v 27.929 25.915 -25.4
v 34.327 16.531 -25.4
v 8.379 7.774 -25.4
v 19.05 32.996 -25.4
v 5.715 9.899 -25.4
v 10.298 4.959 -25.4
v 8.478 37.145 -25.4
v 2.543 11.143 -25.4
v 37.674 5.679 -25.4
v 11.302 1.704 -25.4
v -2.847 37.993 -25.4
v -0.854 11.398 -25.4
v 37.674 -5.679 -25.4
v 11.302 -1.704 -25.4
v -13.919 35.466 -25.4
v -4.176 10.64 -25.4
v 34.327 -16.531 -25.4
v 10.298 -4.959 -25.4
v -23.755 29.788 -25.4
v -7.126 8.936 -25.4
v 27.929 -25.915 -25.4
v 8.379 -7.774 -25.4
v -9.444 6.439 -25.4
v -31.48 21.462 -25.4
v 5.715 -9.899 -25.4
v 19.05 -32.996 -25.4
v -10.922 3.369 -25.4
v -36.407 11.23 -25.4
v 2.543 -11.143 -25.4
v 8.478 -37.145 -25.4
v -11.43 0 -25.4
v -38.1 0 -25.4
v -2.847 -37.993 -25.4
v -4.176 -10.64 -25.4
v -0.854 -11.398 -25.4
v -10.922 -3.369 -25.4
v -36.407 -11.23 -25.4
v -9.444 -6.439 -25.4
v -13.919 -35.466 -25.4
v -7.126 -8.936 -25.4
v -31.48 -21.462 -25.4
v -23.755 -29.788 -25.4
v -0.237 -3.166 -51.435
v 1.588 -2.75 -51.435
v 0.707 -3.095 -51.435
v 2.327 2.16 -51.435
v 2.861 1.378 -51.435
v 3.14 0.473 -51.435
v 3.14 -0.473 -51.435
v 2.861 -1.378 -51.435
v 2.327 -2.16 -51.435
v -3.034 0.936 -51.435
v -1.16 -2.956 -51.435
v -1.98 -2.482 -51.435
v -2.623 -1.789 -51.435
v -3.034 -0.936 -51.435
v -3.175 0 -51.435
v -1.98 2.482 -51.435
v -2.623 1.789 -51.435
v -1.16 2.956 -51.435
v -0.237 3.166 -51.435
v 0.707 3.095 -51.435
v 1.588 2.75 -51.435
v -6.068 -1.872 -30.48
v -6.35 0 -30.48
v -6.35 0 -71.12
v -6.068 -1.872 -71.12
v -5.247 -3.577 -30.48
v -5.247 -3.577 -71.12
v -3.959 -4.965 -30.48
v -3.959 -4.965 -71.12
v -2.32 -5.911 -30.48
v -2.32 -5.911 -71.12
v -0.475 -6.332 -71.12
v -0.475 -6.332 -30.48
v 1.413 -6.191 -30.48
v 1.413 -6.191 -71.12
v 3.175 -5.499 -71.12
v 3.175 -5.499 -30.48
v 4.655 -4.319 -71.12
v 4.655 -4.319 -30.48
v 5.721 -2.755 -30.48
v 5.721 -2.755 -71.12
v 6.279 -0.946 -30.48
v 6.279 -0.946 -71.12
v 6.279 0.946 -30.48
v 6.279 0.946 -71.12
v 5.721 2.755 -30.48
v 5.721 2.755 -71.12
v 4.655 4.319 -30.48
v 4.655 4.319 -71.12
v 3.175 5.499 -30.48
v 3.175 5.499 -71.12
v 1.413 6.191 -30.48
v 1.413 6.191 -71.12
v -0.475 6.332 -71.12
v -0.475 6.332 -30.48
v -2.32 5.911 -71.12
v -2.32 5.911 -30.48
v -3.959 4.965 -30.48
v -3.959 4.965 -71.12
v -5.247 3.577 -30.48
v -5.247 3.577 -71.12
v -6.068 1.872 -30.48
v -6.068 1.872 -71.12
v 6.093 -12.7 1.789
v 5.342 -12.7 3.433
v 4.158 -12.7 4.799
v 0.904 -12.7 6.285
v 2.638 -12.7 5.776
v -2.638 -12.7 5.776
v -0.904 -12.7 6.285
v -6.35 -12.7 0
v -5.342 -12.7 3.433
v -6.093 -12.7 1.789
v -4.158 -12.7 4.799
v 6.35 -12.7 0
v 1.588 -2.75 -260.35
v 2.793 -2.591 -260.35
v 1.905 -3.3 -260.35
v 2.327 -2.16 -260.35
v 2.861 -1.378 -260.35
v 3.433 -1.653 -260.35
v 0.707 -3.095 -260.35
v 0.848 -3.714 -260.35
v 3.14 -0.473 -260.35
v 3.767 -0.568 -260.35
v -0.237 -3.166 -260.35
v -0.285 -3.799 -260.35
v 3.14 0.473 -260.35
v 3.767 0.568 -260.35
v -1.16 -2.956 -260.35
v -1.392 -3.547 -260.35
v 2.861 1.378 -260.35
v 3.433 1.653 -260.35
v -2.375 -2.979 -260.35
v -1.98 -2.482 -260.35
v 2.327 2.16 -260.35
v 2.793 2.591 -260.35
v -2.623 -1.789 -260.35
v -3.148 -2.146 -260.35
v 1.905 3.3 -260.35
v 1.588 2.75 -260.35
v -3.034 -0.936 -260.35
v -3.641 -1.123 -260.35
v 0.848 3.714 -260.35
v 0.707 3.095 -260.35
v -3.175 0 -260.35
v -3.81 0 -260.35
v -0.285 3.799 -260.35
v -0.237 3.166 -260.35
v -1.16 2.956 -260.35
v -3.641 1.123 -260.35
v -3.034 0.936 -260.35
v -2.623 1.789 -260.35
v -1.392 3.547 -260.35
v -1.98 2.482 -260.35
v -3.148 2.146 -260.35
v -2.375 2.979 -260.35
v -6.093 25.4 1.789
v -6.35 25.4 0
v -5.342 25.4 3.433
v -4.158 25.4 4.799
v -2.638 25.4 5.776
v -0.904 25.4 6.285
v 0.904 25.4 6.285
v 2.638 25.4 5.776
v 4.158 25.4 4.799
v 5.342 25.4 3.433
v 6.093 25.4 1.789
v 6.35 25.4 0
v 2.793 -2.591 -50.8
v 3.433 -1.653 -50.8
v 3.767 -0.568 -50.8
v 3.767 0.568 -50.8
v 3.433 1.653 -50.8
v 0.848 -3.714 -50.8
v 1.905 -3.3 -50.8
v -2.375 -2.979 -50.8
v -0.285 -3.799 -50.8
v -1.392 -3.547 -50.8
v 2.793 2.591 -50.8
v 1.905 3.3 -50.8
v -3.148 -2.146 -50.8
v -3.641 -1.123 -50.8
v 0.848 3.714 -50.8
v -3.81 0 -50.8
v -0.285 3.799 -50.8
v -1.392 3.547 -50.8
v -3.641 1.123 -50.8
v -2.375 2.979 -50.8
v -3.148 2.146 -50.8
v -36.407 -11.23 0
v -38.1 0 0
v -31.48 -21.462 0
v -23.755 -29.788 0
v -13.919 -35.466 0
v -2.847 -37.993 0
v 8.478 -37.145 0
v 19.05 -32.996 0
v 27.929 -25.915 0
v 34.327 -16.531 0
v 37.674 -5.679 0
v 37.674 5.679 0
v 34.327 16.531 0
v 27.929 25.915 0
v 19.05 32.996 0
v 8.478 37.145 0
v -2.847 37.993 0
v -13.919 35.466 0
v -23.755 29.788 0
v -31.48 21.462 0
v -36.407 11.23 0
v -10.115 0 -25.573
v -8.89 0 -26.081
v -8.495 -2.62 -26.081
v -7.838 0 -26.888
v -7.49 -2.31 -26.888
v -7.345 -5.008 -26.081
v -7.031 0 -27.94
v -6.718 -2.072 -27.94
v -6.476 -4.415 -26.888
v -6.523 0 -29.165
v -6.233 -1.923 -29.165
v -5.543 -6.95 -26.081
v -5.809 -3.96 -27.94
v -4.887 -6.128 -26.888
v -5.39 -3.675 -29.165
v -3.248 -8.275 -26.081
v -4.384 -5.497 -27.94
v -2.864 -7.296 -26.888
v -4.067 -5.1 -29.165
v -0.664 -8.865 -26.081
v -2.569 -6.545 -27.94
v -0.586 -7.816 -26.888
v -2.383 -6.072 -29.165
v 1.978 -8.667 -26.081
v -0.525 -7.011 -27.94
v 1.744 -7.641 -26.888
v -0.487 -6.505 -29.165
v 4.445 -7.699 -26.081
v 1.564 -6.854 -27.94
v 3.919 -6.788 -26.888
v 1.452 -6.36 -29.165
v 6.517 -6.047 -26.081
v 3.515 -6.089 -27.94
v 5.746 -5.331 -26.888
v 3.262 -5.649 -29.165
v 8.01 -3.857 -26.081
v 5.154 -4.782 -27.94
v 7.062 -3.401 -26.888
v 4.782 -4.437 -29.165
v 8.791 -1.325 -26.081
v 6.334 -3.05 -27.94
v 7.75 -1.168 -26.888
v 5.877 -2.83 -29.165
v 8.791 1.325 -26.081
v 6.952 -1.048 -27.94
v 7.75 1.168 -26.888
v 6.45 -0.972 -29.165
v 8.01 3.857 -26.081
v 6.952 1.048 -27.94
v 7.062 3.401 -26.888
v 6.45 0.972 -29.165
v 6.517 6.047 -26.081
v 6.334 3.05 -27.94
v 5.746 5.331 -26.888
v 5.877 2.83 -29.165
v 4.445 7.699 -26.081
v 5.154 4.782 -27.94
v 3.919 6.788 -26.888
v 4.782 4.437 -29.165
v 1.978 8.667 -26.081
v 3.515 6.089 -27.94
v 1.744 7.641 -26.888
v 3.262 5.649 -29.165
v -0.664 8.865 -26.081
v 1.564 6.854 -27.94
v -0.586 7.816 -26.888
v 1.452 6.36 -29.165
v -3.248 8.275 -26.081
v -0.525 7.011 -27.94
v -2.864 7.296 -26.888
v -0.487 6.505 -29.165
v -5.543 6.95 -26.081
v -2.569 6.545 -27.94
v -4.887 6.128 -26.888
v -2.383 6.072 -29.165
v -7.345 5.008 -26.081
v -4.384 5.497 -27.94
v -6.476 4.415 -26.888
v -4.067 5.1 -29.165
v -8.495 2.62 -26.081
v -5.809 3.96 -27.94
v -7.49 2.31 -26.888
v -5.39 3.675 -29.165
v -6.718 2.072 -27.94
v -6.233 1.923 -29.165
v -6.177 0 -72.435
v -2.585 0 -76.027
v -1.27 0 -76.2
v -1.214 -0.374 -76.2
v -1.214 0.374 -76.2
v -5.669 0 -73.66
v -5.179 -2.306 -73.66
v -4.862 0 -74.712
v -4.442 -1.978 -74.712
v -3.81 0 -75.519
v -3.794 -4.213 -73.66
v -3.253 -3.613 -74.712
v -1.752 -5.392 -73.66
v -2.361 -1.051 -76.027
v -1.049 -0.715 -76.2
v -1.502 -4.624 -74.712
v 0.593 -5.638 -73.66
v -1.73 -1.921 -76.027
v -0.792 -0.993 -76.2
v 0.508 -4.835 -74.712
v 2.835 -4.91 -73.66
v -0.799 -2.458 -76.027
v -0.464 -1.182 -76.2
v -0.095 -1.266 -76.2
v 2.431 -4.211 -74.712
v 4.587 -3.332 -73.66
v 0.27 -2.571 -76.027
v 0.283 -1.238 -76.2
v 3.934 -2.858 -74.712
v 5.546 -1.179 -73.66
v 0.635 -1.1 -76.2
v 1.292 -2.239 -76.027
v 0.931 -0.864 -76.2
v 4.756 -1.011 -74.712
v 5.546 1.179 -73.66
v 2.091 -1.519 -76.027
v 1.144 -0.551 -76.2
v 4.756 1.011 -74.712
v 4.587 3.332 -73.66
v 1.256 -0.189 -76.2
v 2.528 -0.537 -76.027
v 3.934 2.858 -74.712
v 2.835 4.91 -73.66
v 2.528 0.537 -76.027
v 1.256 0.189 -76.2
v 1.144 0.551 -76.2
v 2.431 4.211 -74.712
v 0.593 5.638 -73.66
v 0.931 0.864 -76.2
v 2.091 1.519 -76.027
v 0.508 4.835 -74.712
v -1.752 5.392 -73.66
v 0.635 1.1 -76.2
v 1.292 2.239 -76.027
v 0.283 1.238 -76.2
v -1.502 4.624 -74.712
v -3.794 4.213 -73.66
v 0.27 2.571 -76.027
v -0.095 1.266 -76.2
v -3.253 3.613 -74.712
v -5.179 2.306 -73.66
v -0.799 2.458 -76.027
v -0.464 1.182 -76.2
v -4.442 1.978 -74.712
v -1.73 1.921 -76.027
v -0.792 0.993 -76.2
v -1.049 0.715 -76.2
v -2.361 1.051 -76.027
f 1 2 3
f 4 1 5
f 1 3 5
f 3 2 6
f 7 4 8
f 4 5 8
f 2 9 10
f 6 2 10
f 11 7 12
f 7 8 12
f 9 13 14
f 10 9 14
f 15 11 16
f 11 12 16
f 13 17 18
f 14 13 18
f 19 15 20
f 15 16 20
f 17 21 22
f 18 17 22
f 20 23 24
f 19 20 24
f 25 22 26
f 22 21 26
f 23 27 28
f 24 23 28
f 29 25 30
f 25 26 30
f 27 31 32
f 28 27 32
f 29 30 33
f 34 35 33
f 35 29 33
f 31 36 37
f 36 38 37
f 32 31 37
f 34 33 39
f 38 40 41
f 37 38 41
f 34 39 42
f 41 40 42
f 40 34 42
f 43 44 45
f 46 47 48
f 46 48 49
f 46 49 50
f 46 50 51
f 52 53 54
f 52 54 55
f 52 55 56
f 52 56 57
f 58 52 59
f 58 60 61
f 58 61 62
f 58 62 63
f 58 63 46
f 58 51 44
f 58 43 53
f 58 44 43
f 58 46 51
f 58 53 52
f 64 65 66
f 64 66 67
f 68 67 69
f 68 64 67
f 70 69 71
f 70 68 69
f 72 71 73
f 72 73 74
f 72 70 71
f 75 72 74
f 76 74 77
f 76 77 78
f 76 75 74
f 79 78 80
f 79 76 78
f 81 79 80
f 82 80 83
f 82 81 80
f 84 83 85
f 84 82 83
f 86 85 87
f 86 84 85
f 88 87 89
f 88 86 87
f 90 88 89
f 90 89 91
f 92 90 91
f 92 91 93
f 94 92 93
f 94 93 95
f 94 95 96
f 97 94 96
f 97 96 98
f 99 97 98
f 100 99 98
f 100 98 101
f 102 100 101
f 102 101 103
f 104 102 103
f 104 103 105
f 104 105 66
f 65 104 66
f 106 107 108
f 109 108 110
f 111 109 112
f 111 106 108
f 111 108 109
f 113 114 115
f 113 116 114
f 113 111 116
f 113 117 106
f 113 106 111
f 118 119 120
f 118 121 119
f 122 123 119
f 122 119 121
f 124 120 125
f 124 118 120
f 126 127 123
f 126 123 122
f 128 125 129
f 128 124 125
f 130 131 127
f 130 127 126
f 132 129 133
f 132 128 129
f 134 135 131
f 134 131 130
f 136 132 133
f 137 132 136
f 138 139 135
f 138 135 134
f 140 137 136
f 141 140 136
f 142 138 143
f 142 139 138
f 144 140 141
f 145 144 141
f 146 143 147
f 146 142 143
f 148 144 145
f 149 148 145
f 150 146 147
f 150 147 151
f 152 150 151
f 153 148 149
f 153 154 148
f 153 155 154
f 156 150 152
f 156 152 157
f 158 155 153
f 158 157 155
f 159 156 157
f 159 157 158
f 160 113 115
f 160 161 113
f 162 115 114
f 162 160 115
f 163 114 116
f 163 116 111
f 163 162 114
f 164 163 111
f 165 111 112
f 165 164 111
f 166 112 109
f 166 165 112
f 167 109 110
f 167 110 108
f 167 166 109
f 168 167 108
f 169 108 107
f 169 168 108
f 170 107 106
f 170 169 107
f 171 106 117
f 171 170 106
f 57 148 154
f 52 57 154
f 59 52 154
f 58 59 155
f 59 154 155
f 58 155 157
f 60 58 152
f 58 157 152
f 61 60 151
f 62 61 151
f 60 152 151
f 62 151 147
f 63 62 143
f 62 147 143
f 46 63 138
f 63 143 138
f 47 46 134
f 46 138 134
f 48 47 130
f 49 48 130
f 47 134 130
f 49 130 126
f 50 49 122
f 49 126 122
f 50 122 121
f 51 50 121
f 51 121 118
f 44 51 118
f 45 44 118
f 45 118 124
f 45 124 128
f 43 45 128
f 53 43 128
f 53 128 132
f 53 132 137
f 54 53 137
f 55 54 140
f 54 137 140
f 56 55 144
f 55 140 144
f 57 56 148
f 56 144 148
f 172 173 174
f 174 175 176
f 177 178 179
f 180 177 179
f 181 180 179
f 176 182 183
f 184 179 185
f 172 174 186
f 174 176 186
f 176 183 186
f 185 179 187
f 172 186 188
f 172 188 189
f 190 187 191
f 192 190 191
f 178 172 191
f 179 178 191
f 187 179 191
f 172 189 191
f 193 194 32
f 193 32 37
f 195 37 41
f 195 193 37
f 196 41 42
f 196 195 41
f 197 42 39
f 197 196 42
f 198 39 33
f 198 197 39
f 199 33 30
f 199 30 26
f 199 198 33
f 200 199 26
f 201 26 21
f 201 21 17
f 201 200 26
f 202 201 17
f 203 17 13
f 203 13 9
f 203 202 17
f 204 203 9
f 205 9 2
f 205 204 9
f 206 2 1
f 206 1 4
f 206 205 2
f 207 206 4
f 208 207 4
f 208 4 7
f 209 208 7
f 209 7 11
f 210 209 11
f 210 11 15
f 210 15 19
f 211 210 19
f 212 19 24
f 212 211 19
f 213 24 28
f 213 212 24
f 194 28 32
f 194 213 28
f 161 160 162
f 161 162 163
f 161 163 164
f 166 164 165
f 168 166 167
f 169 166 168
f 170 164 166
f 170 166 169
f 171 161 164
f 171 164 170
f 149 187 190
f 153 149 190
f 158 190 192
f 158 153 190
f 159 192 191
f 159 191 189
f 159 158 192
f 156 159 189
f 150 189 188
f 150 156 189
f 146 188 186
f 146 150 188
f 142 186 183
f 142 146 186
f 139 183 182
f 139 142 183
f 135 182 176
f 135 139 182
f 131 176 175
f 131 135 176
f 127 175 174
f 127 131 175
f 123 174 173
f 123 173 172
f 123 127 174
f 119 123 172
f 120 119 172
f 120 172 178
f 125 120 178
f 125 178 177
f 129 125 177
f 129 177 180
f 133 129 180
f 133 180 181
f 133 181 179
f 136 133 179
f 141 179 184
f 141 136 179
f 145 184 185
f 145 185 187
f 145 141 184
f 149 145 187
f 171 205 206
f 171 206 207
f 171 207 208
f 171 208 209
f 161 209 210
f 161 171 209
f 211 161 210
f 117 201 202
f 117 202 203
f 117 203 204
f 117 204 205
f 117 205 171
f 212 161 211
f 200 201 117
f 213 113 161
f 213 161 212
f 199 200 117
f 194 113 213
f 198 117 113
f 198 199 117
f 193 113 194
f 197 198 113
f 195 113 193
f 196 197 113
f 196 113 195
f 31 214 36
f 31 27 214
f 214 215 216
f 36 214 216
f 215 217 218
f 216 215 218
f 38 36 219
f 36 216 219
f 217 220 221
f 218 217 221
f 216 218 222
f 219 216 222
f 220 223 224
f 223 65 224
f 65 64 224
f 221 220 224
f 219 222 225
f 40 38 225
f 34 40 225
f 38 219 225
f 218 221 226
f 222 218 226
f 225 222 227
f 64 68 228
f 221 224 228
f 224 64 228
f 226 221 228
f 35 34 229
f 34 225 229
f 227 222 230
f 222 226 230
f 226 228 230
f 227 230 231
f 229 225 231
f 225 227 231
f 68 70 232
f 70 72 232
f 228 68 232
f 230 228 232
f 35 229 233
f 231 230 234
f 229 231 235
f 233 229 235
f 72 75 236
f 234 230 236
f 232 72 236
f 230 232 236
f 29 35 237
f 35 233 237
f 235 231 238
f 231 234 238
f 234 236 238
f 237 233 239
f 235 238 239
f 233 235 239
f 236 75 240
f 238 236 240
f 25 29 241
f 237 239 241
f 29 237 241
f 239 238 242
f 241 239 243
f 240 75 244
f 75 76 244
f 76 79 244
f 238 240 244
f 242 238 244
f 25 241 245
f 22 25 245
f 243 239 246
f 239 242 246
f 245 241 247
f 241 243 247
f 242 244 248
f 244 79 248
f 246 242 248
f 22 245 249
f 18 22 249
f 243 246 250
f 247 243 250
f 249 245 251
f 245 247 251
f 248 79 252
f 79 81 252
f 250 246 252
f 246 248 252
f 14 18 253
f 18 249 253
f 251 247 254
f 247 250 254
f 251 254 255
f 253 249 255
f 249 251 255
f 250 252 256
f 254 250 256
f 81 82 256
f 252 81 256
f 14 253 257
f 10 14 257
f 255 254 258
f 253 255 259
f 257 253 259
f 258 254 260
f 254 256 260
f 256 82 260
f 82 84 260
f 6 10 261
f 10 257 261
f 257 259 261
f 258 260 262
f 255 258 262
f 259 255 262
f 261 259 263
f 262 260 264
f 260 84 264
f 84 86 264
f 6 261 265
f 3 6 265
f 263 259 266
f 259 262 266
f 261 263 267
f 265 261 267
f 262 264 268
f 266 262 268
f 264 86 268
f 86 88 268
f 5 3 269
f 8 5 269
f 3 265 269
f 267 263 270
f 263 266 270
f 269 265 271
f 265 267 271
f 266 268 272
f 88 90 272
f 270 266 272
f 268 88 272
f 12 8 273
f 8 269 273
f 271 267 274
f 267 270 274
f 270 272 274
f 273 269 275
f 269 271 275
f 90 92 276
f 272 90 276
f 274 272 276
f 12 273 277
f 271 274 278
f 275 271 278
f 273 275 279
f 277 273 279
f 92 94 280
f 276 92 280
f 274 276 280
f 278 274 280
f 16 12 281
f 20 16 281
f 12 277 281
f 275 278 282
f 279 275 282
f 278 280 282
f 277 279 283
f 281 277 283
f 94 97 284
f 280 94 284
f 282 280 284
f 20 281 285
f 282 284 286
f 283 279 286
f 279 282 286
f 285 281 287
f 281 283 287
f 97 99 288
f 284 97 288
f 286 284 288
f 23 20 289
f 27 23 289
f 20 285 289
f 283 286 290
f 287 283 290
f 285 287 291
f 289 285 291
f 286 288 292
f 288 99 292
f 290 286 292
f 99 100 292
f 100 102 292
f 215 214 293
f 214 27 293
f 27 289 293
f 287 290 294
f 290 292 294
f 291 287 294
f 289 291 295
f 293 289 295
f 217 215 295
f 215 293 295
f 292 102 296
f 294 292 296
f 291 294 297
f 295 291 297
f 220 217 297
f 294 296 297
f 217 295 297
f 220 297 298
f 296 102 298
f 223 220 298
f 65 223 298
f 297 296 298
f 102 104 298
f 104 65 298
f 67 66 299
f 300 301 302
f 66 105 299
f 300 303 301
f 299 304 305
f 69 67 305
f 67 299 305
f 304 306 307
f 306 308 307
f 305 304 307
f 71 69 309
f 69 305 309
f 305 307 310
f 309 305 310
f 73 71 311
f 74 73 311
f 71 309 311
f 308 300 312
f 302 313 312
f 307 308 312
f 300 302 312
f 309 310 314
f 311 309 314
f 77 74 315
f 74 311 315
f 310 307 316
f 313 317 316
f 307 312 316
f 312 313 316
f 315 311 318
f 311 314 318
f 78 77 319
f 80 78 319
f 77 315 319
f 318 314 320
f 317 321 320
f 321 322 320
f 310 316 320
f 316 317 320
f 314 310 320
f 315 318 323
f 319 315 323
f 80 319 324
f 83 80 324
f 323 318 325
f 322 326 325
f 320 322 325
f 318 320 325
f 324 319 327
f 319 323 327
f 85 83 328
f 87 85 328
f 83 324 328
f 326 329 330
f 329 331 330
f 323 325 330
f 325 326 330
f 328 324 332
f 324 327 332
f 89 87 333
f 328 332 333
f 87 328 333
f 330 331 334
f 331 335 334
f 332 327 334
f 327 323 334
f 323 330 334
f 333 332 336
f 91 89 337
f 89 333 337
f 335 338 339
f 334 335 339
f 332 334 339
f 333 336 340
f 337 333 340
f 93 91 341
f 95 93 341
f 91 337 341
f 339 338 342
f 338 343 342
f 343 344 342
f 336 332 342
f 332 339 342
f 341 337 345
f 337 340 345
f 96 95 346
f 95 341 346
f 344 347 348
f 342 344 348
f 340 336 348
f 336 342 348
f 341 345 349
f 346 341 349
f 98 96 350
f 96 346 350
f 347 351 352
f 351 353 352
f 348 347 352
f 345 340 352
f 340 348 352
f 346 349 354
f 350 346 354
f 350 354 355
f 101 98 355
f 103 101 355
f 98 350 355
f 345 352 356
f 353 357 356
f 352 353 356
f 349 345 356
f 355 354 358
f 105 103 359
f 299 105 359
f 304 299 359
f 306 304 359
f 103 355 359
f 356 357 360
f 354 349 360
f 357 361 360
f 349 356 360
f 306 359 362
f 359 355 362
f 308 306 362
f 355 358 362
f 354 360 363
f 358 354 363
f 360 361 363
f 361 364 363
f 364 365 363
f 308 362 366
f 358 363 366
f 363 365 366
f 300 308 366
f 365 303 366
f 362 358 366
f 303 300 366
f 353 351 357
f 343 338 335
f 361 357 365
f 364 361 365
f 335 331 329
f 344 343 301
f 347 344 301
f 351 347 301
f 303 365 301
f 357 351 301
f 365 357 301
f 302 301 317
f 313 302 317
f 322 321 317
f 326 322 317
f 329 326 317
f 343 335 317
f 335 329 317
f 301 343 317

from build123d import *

# Parameters (mm, degrees)
F0_R          = 6.35
F1_DEPTH      = 76.2
F2_R          = 3.81
F3_DEPTH      = 184.15
F3_DEPTH_BACK = 25.4
F4_R          = 38.1
F5_DEPTH      = 25.4
F6_R          = 5.08
F9_T          = -0.635
F10_ANGLE     = 180


with BuildPart() as f1:
    # F0 (on Top) → F1 (new body)
    with BuildSketch(Plane.XY):
        Circle(F0_R)
    extrude(amount=-F1_DEPTH)

    # F4 (on Top) → F5 (join)
    with BuildSketch(Plane.XY):
        Circle(F4_R)
    extrude(amount=-F5_DEPTH)

    # F6
    f6_edges = [f1.edges().sort_by_distance(p)[0] for p in [
        (-6.35, 0, -76.2),
        (-6.35, 0, -25.4),
        (6.35, 0, -50.8),
    ]]
    fillet(f6_edges, radius=F6_R)

    # F7 (on face) → F8 (revolve)
    with BuildSketch(Plane.XY):
        Polygon((0, -25.4), (0, 0), (0, 12.7), (-6.35, 12.7), (-6.35, -25.4), align=None)
    revolve(axis=Axis((0, -12.7, 0), (0, -1, 0)))


with BuildPart() as f3:
    # F2 (on face) → F3 (new body, two sides)
    with BuildSketch(Plane(origin=(0, 0, -76.2), x_dir=(1, 0, 0), z_dir=(0, 0, -1))) as f3_sk:
        Circle(F2_R)
    extrude(amount=F3_DEPTH)
    extrude(f3_sk.sketch, amount=-F3_DEPTH_BACK)

    # F9
    f9_openings = [f3.faces().sort_by_distance(p)[0] for p in [
        (0, 0, -260.35),
    ]]
    offset(amount=F9_T, openings=f9_openings)


with BuildPart() as f1_1:
    # F10: moved
    add(f1.part.rotate(Axis((0, 0, 0), (0, 0, 1)), F10_ANGLE))


with BuildPart() as f3_1:
    # F10: moved
    add(f3.part.rotate(Axis((0, 0, 0), (0, 0, 1)), F10_ANGLE))


solid = Compound([f1_1.part, f3_1.part])
